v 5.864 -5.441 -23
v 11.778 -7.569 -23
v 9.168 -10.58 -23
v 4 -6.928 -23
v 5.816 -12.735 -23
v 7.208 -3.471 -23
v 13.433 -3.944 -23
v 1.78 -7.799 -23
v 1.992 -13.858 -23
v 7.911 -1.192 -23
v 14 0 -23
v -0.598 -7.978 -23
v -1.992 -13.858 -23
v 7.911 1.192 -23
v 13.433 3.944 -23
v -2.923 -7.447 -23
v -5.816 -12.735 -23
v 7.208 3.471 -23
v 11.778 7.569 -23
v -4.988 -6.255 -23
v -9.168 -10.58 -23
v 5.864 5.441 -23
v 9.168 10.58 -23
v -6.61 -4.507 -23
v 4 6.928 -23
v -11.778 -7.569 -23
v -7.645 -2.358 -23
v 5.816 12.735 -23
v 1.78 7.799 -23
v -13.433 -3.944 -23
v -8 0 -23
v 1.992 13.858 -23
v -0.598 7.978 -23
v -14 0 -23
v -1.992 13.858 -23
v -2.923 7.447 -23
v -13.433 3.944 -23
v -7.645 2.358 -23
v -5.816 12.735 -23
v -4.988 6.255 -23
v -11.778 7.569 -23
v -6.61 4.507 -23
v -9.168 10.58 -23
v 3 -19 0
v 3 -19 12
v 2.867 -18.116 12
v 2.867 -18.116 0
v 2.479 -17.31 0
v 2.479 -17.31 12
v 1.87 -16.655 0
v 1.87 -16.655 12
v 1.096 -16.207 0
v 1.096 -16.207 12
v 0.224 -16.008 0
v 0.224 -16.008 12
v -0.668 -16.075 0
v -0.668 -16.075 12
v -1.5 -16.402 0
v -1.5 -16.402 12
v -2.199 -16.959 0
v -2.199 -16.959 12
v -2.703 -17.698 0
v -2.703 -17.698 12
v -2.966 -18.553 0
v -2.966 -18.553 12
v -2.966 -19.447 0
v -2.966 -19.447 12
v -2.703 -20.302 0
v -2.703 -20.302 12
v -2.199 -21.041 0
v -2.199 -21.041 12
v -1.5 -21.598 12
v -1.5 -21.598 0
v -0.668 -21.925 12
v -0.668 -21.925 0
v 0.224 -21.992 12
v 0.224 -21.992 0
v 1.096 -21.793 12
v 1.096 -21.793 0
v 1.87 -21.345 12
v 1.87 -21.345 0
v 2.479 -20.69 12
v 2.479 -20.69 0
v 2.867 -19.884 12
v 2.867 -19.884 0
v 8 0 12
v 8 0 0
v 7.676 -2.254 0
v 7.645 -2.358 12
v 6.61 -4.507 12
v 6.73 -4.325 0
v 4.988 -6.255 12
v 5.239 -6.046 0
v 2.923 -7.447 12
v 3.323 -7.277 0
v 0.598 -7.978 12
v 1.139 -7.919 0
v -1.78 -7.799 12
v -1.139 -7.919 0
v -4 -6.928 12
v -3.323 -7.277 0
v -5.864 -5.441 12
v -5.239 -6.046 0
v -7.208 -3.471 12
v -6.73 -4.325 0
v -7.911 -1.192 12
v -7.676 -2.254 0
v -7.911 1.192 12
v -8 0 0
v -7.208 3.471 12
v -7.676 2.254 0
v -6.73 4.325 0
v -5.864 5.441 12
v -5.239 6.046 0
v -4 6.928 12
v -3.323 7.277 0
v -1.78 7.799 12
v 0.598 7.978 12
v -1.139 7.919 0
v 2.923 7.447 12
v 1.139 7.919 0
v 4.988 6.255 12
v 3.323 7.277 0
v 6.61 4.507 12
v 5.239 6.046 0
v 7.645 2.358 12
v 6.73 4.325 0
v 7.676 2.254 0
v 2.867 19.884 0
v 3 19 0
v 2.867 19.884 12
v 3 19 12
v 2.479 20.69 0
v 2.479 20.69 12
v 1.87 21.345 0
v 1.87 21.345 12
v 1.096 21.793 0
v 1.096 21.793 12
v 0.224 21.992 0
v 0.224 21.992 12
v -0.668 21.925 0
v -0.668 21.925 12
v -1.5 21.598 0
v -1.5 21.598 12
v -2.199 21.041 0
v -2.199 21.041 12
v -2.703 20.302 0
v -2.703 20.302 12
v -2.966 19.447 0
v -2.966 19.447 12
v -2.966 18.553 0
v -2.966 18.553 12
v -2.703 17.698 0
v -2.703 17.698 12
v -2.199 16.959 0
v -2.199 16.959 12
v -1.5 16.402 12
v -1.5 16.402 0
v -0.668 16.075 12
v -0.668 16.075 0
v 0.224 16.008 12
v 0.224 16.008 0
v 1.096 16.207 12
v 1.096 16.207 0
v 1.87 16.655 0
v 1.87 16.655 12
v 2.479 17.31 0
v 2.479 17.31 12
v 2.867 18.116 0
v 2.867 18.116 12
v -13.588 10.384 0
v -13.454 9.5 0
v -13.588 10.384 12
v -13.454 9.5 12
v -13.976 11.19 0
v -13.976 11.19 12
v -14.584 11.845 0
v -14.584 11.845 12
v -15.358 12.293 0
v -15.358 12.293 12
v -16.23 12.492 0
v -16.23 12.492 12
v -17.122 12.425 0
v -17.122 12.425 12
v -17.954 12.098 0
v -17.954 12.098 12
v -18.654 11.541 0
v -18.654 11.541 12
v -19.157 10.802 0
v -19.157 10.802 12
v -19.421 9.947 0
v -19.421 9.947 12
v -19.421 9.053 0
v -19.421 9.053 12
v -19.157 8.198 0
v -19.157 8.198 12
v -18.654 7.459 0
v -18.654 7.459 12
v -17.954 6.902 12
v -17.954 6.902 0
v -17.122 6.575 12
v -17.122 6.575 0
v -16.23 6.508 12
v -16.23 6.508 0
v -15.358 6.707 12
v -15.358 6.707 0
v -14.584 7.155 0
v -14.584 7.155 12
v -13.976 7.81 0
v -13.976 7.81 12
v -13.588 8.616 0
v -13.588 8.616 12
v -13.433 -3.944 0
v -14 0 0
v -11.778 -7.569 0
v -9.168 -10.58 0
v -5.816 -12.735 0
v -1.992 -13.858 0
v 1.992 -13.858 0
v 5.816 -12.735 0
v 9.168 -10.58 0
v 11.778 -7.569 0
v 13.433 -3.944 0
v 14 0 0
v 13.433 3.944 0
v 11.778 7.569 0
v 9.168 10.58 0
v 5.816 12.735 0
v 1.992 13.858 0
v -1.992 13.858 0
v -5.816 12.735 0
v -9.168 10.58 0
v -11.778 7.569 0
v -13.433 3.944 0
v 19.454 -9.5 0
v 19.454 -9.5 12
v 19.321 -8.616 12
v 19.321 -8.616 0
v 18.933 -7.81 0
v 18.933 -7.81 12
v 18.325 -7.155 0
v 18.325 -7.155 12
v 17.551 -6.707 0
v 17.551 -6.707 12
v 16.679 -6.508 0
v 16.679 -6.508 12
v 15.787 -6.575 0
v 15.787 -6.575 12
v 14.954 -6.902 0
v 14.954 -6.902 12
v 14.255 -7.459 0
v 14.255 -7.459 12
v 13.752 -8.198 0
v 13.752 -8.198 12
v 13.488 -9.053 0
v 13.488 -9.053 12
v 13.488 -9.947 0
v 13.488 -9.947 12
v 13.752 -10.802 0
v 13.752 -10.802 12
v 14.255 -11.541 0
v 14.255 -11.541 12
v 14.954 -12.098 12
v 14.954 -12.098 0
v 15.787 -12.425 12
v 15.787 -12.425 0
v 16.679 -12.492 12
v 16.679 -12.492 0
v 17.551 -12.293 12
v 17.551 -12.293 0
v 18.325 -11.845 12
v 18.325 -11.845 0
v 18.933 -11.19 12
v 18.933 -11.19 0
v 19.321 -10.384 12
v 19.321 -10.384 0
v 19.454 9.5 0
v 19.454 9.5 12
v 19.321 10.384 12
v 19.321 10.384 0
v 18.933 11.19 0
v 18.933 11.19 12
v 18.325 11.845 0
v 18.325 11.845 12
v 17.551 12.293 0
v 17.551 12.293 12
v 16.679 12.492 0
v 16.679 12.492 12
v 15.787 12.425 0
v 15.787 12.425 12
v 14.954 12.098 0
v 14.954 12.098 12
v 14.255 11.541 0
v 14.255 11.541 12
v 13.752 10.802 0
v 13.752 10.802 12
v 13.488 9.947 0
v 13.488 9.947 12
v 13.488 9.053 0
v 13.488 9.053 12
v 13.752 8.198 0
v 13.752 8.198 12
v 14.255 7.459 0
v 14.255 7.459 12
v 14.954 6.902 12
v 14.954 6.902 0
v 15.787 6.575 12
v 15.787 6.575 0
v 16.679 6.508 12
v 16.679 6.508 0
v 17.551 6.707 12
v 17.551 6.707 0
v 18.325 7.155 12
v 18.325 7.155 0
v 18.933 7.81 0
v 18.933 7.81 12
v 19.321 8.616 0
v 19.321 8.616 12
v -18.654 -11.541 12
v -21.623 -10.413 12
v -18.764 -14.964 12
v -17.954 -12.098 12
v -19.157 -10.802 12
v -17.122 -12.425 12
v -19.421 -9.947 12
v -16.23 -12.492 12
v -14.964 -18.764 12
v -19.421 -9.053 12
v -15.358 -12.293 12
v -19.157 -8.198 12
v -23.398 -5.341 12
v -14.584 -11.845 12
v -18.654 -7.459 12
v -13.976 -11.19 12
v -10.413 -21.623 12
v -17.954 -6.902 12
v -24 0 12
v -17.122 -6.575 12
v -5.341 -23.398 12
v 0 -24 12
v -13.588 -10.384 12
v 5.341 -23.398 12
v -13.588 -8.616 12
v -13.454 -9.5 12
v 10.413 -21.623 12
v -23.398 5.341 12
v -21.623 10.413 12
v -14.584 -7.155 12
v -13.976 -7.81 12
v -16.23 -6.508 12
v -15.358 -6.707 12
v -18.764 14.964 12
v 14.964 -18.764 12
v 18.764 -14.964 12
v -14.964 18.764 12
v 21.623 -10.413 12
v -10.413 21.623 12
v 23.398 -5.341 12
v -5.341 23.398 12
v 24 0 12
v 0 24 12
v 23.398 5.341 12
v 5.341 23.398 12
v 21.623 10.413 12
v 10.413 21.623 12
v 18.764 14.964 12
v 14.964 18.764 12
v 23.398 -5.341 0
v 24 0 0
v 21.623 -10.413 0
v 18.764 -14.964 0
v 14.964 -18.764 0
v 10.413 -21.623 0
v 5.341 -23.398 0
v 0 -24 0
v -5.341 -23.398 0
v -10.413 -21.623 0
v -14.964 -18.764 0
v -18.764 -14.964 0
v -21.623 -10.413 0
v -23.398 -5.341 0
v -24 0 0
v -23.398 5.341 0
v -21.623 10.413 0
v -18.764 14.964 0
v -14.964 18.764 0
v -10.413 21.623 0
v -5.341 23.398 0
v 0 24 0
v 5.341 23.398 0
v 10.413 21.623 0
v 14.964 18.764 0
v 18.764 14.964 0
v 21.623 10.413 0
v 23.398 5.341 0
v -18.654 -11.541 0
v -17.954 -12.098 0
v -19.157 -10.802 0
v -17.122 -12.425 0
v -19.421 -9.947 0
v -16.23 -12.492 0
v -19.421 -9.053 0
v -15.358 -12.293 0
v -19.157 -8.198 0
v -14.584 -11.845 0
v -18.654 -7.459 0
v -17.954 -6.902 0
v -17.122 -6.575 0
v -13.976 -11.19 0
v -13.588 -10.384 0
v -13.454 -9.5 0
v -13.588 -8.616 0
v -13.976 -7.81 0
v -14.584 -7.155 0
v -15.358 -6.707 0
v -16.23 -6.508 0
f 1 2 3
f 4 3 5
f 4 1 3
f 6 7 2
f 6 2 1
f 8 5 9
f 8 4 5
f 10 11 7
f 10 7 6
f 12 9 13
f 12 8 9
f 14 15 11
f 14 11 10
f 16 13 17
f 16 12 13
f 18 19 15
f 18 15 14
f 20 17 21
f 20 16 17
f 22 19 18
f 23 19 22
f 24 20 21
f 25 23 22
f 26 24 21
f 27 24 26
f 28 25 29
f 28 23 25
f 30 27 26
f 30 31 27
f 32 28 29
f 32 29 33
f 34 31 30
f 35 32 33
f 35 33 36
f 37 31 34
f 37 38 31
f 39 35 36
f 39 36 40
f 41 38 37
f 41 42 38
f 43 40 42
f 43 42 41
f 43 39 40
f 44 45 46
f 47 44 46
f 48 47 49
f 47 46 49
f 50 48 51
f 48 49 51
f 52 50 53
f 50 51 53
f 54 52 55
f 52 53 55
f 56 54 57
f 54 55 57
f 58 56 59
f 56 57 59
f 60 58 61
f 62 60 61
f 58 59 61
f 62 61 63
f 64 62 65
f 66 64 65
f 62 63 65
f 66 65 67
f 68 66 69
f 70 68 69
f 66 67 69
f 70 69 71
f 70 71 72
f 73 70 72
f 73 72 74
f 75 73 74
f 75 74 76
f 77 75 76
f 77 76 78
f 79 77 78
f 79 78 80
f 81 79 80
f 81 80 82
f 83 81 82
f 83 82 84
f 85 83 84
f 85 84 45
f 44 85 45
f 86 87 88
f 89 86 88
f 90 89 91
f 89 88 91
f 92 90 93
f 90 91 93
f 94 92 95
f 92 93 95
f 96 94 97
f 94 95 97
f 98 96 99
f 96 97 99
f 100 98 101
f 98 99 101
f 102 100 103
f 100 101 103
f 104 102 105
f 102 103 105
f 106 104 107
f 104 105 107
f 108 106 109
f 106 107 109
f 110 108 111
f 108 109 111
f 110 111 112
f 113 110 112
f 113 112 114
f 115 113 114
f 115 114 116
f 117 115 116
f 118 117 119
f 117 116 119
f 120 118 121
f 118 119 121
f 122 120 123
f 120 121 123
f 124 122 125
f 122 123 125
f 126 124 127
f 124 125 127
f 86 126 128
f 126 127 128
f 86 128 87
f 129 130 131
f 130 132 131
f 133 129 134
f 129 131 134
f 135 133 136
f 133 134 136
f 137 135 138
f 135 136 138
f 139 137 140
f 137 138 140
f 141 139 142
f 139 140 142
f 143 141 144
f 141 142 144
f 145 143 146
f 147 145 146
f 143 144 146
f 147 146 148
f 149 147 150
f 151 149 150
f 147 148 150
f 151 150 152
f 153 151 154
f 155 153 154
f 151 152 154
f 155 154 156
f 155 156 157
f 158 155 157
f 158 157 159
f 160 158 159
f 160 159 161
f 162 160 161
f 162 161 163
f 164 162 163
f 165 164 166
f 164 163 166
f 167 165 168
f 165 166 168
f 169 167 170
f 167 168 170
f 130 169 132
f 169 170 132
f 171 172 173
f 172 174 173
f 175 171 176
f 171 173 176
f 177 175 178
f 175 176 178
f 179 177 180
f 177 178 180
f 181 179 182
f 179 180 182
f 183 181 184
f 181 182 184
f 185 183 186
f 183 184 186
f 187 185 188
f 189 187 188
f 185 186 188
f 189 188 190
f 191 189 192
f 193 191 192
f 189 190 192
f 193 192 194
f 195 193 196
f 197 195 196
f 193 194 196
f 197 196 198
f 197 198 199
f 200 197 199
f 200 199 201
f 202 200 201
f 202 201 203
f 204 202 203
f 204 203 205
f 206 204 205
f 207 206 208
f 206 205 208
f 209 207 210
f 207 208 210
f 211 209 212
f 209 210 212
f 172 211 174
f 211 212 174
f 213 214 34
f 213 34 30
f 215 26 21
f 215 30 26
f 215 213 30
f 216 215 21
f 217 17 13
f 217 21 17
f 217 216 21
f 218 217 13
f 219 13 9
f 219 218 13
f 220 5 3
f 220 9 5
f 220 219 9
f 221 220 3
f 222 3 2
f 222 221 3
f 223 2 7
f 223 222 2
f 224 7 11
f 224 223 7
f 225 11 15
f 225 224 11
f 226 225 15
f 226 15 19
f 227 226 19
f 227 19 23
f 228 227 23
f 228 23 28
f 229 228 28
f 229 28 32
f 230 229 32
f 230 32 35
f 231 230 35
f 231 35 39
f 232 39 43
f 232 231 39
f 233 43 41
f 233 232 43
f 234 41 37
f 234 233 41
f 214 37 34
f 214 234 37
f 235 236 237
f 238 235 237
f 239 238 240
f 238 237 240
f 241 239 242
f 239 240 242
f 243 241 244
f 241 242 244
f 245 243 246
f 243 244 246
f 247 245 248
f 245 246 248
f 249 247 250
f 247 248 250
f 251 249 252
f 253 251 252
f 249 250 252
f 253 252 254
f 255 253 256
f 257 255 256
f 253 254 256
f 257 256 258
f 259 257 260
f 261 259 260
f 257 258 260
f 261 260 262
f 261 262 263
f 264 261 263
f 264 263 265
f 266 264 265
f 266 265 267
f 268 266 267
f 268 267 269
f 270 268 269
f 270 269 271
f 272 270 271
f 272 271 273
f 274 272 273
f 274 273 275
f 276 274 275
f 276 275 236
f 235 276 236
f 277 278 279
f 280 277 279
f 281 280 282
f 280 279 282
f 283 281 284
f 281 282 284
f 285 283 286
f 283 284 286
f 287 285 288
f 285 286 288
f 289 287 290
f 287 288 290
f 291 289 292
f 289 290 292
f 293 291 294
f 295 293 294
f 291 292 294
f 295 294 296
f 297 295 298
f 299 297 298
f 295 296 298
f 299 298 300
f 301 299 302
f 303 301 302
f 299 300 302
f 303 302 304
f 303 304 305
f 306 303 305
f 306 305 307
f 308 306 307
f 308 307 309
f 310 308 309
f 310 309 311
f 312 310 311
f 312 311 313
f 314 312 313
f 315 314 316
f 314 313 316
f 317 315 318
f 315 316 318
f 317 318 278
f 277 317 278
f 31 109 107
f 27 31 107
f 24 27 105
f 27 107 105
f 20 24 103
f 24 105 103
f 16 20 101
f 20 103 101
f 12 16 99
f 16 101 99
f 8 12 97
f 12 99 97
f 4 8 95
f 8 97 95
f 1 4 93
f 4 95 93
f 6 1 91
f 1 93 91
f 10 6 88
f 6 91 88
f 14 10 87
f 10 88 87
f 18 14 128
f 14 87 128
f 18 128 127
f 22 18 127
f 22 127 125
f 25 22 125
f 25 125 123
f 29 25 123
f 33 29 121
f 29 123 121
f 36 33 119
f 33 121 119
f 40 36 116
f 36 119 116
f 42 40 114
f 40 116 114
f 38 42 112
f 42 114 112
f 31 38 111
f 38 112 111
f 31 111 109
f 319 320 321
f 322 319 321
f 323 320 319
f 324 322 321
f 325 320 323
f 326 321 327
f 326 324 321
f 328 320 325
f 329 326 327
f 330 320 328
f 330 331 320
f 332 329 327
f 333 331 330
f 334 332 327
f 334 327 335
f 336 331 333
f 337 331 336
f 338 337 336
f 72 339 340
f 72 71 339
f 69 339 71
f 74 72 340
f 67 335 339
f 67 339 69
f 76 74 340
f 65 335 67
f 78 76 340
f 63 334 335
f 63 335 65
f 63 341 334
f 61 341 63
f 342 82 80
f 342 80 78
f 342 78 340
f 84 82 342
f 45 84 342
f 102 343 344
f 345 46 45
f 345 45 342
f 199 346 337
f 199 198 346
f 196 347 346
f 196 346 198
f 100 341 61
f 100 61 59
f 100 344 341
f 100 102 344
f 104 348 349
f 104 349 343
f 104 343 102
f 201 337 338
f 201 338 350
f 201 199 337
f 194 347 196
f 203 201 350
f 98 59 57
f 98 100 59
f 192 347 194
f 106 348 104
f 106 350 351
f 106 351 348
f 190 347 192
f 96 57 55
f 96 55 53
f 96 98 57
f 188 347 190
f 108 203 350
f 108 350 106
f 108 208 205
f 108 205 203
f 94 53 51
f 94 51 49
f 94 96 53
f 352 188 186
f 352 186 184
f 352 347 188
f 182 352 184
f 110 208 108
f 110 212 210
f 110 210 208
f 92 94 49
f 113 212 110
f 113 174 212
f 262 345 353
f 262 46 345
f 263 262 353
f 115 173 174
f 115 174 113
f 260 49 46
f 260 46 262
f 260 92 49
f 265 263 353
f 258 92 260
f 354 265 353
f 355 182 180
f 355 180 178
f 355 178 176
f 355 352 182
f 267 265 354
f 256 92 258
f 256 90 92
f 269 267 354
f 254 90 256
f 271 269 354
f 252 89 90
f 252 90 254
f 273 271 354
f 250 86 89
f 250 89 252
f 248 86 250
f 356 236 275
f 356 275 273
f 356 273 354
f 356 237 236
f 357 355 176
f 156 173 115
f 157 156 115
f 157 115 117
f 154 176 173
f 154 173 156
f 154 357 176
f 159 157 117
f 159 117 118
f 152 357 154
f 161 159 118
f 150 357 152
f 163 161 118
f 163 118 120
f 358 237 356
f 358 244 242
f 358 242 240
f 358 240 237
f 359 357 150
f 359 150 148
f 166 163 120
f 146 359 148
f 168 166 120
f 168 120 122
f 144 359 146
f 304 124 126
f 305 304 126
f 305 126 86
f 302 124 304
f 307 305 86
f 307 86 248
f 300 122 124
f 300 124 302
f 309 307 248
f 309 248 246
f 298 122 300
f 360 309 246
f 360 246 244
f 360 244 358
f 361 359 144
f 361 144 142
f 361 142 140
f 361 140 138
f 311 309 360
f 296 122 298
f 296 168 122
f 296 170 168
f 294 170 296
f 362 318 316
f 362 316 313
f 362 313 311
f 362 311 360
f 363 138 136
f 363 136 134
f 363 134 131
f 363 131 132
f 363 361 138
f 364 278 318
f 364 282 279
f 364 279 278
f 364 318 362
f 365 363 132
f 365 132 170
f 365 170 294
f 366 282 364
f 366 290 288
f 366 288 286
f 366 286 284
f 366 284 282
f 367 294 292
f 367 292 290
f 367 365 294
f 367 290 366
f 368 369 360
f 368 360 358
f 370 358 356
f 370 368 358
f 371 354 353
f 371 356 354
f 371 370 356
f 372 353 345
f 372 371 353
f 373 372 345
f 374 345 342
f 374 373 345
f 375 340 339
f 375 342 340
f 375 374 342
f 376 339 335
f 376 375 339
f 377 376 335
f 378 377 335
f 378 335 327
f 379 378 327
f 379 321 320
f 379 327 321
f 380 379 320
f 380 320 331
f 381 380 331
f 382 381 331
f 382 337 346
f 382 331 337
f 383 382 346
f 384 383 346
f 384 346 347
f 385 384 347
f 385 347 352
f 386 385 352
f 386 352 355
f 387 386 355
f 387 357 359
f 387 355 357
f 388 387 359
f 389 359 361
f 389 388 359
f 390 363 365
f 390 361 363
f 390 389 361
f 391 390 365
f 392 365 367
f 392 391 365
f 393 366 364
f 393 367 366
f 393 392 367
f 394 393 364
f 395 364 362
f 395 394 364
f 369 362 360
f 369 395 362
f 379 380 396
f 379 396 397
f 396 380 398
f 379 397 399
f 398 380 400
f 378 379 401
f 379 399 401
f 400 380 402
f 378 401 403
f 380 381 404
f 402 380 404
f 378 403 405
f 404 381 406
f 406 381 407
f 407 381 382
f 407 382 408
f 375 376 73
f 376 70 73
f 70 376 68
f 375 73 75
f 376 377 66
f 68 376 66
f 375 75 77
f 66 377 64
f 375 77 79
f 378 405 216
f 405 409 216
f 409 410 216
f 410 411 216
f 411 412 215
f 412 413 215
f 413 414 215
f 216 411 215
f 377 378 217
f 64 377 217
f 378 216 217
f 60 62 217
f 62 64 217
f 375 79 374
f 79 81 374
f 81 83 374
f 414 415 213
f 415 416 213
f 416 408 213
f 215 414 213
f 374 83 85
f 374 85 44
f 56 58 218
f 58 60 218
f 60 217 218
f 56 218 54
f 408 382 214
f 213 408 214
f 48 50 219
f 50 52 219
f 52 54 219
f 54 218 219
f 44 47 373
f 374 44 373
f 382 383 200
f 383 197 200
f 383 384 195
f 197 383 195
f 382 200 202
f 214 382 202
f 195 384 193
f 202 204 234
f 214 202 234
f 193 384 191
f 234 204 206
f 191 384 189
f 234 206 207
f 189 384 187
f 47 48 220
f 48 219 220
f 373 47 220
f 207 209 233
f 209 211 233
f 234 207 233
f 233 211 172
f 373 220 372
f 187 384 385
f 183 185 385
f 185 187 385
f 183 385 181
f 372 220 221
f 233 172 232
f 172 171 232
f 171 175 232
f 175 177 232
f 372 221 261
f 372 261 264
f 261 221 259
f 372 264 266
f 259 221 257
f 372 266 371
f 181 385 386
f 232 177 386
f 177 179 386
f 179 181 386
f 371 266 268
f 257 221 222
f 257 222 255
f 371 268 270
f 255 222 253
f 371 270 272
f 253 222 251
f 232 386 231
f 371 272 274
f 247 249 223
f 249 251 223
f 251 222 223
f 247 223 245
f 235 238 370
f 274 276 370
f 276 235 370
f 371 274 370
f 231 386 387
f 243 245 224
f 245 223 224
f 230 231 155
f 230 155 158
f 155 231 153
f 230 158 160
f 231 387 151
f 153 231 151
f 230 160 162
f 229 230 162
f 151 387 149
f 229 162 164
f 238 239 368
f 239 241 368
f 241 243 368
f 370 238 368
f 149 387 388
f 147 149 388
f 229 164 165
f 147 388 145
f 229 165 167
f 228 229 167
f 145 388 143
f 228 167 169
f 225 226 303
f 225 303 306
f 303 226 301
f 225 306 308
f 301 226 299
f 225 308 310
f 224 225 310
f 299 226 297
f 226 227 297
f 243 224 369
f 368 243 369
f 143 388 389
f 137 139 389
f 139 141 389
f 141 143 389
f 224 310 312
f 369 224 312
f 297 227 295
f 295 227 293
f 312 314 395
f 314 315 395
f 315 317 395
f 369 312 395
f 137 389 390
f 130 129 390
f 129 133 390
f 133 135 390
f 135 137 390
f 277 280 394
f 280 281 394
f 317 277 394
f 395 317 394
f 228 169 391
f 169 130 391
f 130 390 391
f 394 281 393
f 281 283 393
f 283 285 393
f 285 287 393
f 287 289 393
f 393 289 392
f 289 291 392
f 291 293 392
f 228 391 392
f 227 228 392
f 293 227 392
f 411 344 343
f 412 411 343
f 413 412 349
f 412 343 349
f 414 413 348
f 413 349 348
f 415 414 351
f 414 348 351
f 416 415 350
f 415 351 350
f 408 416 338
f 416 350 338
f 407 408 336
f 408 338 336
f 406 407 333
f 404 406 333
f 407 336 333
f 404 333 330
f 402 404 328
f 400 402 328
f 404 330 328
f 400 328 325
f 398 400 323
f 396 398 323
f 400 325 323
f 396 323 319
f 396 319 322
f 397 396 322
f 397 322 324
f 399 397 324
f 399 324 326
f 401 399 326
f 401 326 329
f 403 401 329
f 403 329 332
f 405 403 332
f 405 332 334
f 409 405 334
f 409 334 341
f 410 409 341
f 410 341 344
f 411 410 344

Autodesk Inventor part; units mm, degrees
ref_plane "YZ Plane" through (0, 0, 0) normal (1, 0, 0) x (0, 1, 0)
ref_plane "XZ Plane" through (0, 0, 0) normal (0, 1, 0) x (-1, 0, 0)
ref_plane "XY Plane" through (0, 0, 0) normal (0, 0, 1) x (1, 0, 0)
sketch "Szkic1" plane through (0, 0, 0) normal (0, 0, 1) x (1, 0, 0)
  circle A0 centre (0, 0) radius 24
  circle A1 centre (0, 0) radius 8
  dimension "d0" = 48
  dimension "d1" = 16
extrude "Wyciągnięcie proste1" add sketch "Szkic1" along normal blind 12
sketch "Szkic2" plane through (0, 0, 0) normal (0, 0, -1) x (-1, 0, 0)
  circle A0 centre (0, 0) radius 8 projected
  circle A1 centre (0, 0) radius 14
  dimension "d4" = 28
extrude "Wyciągnięcie proste2" add sketch "Szkic2" along normal blind 23
sketch "Szkic3" plane through (0, 0, 12) normal (0, 0, 1) x (1, 0, 0)
  circle A0 centre (0, 0) radius 19
  circle A1 centre (0, 19) radius 3
  circle A2 centre (16.4545, 9.5) radius 3
  circle A3 centre (16.4545, -9.5) radius 3
  circle A4 centre (0, -19) radius 3
  circle A5 centre (-16.4545, -9.5) radius 3
  circle A6 centre (-16.4545, 9.5) radius 3
  dimension "d7" = 38
  dimension "d8" = 6
  dimension "d11" = 360
extrude "Wyciągnięcie proste3" cut sketch "Szkic3" against normal up to next contours A2 A0 | A0 A2 | A3 A0 | A0 A3 | A1 A0 | A0 A1 | A4 A0 | A0 A4 | A6 A0 | A0 A6 | A5 A0 | A0 A5
properties part number "Nakrętka trapezowa kołnierzowa JFRM-2835TR16x4"
